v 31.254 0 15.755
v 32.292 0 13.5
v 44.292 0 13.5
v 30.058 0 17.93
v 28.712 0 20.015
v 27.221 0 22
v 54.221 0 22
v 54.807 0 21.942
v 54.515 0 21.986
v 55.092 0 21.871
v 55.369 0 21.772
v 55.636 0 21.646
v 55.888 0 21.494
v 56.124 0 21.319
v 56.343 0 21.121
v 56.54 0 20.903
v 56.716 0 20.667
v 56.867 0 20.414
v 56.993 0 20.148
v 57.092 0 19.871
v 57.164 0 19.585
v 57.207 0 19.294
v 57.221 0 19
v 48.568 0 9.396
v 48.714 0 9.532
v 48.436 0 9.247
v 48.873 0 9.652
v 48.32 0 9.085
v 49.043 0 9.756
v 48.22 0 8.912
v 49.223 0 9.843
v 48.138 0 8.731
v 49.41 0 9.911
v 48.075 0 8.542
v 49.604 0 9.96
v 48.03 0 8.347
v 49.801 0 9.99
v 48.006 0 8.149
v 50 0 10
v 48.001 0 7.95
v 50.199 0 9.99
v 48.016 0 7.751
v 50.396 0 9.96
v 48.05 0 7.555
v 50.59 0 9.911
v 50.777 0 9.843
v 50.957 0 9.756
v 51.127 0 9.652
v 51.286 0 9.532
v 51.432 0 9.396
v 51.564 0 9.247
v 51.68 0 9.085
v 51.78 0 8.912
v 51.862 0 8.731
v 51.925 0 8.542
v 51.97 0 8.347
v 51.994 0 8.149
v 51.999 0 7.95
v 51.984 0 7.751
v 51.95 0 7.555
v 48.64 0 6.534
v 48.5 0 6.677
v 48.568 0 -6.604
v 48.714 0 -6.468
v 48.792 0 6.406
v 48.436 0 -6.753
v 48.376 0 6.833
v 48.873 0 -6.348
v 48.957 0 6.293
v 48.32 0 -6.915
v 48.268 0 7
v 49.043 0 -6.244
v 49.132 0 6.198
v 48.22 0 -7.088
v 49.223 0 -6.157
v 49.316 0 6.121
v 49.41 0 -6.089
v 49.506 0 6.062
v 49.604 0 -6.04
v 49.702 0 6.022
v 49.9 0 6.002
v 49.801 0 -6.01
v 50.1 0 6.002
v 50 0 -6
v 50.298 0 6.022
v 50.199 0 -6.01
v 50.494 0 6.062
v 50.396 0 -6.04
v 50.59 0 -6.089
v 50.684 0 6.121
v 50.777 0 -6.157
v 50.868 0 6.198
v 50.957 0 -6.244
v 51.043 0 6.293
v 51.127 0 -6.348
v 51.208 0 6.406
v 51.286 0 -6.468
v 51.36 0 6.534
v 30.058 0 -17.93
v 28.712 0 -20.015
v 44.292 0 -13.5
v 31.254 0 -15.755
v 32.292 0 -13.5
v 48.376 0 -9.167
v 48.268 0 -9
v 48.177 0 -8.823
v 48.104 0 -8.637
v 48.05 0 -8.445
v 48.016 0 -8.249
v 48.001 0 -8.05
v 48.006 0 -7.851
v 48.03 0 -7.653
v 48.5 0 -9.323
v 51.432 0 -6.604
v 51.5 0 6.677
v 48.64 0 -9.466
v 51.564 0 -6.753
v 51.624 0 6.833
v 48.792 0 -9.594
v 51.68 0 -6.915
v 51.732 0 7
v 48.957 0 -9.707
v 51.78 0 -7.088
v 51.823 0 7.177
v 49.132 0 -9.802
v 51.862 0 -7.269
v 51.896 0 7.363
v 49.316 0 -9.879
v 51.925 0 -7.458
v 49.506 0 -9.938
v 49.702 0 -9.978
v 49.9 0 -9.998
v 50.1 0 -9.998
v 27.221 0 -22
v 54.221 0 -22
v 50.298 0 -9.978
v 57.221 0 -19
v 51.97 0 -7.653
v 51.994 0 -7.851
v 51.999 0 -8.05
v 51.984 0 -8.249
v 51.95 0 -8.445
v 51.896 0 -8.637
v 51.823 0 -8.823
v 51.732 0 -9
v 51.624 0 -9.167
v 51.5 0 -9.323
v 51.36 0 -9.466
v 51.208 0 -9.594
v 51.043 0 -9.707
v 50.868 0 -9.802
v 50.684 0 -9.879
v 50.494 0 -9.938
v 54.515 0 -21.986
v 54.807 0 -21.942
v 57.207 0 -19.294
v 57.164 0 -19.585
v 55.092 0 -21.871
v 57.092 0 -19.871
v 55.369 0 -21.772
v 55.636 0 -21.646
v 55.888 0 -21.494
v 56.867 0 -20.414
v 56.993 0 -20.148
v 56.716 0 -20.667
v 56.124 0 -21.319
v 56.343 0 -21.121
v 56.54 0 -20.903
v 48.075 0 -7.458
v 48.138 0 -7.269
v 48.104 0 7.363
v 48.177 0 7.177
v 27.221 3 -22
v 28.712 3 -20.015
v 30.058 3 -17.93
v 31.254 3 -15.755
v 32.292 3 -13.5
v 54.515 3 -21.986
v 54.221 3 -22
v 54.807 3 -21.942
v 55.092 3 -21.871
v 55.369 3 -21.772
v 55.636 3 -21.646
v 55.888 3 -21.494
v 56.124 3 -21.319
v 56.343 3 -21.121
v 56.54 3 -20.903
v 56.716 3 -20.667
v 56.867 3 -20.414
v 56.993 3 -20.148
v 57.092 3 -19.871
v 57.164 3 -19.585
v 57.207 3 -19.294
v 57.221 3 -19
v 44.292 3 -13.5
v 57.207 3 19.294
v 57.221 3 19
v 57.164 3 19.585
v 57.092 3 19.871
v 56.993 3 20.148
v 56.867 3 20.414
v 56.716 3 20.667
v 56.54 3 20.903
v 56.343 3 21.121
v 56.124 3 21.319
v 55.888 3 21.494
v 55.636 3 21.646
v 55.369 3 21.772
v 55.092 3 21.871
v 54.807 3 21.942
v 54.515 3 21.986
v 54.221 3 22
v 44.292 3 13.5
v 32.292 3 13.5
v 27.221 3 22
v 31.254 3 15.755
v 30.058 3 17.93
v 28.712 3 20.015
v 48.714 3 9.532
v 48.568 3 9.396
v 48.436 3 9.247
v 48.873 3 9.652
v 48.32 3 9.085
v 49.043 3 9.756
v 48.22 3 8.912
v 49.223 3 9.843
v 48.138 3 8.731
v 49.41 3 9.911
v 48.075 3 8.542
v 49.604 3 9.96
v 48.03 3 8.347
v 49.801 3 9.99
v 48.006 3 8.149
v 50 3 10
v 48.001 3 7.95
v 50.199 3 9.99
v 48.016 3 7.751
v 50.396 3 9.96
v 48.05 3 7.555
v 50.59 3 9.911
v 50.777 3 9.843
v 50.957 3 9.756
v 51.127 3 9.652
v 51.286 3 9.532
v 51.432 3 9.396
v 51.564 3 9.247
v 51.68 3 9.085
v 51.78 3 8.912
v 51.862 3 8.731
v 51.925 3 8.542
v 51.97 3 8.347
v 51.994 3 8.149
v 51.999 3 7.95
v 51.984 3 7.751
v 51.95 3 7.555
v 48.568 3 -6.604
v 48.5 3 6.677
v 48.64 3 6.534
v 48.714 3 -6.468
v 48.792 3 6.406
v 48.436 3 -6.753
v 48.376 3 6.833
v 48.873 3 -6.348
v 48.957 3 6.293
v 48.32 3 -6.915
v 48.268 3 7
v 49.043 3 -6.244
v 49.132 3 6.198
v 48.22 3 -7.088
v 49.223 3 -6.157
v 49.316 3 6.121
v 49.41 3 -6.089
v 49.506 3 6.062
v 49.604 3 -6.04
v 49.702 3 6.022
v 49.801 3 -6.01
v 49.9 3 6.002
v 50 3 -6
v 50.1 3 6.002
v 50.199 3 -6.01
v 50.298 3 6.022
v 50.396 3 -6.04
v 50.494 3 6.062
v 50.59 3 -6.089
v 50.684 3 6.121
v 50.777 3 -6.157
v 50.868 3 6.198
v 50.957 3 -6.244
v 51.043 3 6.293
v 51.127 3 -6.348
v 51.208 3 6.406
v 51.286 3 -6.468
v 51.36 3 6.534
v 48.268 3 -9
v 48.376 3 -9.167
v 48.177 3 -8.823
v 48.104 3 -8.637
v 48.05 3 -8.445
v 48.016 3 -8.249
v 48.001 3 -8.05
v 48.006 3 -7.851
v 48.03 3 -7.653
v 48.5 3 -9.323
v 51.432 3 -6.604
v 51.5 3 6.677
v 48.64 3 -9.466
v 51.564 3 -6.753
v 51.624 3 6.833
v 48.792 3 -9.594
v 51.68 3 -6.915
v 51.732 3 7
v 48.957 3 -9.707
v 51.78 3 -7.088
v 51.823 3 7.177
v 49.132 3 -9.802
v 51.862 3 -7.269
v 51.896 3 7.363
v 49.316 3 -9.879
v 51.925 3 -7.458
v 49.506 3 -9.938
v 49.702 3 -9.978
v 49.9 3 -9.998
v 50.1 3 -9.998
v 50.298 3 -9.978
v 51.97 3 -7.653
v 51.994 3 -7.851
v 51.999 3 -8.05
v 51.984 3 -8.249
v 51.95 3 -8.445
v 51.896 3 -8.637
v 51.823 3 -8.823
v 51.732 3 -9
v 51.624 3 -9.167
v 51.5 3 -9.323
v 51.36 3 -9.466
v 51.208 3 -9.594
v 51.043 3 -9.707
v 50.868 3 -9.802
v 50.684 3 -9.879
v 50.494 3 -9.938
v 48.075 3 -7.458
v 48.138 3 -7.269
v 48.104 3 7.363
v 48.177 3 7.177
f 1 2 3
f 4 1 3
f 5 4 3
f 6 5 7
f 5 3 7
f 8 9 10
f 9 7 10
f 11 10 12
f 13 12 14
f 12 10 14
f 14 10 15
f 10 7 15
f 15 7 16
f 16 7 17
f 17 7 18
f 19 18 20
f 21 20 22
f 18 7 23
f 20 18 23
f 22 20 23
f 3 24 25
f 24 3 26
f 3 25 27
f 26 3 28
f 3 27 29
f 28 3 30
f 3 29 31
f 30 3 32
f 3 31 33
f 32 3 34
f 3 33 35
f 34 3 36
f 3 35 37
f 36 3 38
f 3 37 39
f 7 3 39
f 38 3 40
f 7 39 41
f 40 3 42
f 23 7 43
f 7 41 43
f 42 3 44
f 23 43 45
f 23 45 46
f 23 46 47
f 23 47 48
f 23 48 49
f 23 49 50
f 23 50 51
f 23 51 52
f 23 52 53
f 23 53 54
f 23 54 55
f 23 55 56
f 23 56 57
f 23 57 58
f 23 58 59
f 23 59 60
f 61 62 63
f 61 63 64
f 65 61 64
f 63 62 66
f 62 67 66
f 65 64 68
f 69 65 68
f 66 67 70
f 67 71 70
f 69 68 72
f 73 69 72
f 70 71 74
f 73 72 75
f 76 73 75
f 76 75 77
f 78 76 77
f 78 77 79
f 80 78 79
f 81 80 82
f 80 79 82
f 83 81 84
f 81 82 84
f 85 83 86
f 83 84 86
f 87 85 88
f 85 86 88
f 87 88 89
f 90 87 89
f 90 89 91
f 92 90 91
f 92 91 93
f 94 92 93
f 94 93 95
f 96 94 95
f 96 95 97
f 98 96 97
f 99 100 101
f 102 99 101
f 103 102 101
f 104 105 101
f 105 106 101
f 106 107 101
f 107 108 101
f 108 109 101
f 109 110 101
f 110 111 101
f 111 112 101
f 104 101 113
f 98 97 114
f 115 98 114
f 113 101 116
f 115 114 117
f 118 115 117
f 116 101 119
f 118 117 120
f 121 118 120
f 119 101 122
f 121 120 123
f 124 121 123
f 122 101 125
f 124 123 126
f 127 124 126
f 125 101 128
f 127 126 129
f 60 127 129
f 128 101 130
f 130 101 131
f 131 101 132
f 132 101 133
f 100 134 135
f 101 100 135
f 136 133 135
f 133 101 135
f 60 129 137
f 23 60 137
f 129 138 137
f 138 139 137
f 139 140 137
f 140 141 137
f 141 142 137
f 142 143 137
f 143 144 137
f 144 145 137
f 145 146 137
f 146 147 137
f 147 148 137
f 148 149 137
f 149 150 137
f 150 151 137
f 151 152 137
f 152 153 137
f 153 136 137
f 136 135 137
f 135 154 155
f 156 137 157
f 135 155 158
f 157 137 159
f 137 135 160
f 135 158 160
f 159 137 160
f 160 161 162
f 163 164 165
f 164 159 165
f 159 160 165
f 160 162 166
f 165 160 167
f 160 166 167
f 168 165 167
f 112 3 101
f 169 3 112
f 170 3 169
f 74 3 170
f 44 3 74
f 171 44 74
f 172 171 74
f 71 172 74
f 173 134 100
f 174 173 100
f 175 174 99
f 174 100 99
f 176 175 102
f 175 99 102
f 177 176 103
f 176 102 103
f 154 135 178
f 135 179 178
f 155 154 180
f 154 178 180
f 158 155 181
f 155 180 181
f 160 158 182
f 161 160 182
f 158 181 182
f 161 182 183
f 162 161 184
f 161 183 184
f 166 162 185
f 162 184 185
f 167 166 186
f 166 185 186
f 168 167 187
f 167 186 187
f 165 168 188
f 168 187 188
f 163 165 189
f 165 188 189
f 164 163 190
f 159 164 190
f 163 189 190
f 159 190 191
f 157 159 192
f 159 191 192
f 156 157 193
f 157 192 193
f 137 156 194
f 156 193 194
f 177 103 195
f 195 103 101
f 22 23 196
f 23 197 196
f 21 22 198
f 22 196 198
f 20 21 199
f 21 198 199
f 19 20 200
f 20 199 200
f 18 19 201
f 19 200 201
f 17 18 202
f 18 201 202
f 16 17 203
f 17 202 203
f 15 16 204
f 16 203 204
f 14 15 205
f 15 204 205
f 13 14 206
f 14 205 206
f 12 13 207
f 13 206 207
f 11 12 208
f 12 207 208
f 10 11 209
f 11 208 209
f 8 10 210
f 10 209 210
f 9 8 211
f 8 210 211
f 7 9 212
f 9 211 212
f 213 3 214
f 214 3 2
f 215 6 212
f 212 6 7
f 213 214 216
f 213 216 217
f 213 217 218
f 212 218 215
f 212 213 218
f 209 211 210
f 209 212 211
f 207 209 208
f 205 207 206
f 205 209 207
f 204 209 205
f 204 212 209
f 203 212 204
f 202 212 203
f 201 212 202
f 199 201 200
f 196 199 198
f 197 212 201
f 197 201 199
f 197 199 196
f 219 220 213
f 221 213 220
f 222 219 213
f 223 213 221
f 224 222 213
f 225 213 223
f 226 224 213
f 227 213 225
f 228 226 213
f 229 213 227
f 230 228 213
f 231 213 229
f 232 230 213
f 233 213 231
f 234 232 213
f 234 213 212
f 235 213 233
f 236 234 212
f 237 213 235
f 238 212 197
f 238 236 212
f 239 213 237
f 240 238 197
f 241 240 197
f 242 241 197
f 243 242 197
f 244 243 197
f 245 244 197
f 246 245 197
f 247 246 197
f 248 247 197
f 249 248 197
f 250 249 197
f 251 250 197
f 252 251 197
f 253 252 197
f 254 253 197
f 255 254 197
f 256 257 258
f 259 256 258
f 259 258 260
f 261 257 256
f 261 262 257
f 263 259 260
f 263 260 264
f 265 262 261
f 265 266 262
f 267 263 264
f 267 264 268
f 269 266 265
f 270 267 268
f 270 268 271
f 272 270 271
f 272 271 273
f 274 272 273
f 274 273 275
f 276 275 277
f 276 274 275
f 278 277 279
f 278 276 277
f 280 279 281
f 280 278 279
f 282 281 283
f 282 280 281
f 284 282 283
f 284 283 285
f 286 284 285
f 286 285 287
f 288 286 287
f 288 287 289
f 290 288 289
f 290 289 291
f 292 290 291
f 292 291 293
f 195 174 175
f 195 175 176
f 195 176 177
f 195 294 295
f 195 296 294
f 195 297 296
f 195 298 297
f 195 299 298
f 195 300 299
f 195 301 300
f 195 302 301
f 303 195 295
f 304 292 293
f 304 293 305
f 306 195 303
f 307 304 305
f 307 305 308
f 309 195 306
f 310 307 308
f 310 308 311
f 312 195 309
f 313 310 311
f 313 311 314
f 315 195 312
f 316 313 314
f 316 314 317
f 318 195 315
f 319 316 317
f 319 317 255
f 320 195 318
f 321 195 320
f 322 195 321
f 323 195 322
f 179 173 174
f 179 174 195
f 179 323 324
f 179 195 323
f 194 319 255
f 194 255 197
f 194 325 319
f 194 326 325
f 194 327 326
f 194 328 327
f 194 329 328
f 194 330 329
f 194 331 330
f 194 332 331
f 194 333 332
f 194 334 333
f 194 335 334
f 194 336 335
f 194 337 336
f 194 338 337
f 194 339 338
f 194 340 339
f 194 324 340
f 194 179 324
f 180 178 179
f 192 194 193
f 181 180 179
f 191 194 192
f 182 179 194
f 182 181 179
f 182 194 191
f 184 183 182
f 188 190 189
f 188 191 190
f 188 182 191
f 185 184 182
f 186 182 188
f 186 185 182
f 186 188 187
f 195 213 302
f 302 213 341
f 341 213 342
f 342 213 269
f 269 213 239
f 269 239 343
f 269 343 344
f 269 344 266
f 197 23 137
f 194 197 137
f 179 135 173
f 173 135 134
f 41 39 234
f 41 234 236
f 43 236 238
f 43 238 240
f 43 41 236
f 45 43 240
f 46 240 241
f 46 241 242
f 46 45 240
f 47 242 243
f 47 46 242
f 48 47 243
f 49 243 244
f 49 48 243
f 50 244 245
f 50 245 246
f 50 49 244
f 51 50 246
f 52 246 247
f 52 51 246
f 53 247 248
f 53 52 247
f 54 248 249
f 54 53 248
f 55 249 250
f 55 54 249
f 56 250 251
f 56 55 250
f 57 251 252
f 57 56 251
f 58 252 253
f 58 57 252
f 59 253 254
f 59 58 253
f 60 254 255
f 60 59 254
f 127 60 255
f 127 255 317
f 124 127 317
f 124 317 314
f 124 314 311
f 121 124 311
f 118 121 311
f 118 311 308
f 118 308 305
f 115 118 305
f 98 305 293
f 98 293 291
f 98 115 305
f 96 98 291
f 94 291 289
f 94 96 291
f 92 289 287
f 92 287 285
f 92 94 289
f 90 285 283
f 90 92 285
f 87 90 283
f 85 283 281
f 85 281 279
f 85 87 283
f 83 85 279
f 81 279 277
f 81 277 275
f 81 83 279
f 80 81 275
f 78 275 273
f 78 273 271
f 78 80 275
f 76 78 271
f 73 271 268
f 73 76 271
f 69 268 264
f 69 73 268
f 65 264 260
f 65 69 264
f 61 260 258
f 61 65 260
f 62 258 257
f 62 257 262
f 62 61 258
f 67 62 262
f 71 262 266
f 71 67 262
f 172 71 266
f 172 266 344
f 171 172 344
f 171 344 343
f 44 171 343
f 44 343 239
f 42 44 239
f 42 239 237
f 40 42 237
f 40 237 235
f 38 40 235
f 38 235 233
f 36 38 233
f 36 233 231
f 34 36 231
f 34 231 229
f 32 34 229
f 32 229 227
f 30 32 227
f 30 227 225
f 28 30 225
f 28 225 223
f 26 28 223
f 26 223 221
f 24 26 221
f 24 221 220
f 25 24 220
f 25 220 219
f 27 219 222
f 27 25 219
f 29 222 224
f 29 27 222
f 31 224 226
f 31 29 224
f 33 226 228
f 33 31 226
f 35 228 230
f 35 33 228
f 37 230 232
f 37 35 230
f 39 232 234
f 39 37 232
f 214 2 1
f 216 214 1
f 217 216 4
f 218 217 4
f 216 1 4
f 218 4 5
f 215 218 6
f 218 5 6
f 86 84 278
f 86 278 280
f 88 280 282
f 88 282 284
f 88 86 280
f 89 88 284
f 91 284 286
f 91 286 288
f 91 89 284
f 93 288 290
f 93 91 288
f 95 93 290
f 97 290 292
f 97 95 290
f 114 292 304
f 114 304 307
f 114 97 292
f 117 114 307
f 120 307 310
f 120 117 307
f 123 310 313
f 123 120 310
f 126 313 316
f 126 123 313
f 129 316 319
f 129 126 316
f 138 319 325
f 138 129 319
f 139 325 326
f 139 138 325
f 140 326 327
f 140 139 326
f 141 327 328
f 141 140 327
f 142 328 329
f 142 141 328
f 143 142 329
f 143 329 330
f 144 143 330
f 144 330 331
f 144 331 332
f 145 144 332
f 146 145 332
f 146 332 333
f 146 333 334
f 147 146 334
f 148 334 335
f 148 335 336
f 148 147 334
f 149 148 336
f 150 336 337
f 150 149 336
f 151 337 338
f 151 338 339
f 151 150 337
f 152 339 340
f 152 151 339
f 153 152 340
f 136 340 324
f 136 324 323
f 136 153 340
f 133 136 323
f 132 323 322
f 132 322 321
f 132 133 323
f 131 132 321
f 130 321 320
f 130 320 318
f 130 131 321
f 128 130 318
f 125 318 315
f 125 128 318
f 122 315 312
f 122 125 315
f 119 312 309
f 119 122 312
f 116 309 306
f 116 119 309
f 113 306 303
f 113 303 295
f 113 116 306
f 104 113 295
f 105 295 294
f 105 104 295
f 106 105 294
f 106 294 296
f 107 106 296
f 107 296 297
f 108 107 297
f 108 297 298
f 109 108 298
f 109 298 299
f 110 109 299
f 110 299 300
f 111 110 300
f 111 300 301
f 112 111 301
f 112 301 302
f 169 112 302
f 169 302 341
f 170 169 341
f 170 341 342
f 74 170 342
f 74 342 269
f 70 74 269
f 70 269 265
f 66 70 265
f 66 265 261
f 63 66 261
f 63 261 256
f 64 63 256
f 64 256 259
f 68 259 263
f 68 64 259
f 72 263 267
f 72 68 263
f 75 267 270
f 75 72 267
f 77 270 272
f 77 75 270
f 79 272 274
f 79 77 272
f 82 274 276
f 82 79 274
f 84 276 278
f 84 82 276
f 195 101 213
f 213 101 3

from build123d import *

# Parameters (mm, degrees)
SKETCH_1_R      = 2
EXTRUDE_1_DEPTH = 3
FILLET_1_R      = 3


with BuildPart() as part:
    # 草图1 → 凸台-拉伸1 (new body)
    with BuildSketch(Plane(origin=(0, 0, 0), x_dir=(1, 0, 0), z_dir=(0, 1, 0))):
        with BuildLine():
            Line((57.221315178, 22), (27.221315178, 22))
            ThreePointArc((27.221315178, 22), (30.058450594, 17.930129612), (32.291639785, 13.5))
            Line((32.291639785, 13.5), (44.291639785, 13.5))
            Line((44.291639785, 13.5), (44.291639785, -13.5))
            Line((44.291639785, -13.5), (32.291639785, -13.5))
            ThreePointArc((32.291639785, -13.5), (30.058450594, -17.930129612), (27.221315178, -22))
            Line((27.221315178, -22), (57.221315178, -22))
            Line((57.221315178, -22), (57.221315178, 22))
        make_face()
        with Locations(Location((50, -8, 0), (0, 0, 270))):
            Circle(SKETCH_1_R, mode=Mode.SUBTRACT)
        with Locations(Location((50, 8, 0), (0, 0, 270))):
            Circle(SKETCH_1_R, mode=Mode.SUBTRACT)
    extrude(amount=EXTRUDE_1_DEPTH)

    # 圆角1
    fillet_1_edges = [part.edges().sort_by_distance(p)[0] for p in [
        (57.221315178, 1.5, -22),
        (57.221315178, 1.5, 22),
    ]]
    fillet(fillet_1_edges, radius=FILLET_1_R)


solid = part.part
